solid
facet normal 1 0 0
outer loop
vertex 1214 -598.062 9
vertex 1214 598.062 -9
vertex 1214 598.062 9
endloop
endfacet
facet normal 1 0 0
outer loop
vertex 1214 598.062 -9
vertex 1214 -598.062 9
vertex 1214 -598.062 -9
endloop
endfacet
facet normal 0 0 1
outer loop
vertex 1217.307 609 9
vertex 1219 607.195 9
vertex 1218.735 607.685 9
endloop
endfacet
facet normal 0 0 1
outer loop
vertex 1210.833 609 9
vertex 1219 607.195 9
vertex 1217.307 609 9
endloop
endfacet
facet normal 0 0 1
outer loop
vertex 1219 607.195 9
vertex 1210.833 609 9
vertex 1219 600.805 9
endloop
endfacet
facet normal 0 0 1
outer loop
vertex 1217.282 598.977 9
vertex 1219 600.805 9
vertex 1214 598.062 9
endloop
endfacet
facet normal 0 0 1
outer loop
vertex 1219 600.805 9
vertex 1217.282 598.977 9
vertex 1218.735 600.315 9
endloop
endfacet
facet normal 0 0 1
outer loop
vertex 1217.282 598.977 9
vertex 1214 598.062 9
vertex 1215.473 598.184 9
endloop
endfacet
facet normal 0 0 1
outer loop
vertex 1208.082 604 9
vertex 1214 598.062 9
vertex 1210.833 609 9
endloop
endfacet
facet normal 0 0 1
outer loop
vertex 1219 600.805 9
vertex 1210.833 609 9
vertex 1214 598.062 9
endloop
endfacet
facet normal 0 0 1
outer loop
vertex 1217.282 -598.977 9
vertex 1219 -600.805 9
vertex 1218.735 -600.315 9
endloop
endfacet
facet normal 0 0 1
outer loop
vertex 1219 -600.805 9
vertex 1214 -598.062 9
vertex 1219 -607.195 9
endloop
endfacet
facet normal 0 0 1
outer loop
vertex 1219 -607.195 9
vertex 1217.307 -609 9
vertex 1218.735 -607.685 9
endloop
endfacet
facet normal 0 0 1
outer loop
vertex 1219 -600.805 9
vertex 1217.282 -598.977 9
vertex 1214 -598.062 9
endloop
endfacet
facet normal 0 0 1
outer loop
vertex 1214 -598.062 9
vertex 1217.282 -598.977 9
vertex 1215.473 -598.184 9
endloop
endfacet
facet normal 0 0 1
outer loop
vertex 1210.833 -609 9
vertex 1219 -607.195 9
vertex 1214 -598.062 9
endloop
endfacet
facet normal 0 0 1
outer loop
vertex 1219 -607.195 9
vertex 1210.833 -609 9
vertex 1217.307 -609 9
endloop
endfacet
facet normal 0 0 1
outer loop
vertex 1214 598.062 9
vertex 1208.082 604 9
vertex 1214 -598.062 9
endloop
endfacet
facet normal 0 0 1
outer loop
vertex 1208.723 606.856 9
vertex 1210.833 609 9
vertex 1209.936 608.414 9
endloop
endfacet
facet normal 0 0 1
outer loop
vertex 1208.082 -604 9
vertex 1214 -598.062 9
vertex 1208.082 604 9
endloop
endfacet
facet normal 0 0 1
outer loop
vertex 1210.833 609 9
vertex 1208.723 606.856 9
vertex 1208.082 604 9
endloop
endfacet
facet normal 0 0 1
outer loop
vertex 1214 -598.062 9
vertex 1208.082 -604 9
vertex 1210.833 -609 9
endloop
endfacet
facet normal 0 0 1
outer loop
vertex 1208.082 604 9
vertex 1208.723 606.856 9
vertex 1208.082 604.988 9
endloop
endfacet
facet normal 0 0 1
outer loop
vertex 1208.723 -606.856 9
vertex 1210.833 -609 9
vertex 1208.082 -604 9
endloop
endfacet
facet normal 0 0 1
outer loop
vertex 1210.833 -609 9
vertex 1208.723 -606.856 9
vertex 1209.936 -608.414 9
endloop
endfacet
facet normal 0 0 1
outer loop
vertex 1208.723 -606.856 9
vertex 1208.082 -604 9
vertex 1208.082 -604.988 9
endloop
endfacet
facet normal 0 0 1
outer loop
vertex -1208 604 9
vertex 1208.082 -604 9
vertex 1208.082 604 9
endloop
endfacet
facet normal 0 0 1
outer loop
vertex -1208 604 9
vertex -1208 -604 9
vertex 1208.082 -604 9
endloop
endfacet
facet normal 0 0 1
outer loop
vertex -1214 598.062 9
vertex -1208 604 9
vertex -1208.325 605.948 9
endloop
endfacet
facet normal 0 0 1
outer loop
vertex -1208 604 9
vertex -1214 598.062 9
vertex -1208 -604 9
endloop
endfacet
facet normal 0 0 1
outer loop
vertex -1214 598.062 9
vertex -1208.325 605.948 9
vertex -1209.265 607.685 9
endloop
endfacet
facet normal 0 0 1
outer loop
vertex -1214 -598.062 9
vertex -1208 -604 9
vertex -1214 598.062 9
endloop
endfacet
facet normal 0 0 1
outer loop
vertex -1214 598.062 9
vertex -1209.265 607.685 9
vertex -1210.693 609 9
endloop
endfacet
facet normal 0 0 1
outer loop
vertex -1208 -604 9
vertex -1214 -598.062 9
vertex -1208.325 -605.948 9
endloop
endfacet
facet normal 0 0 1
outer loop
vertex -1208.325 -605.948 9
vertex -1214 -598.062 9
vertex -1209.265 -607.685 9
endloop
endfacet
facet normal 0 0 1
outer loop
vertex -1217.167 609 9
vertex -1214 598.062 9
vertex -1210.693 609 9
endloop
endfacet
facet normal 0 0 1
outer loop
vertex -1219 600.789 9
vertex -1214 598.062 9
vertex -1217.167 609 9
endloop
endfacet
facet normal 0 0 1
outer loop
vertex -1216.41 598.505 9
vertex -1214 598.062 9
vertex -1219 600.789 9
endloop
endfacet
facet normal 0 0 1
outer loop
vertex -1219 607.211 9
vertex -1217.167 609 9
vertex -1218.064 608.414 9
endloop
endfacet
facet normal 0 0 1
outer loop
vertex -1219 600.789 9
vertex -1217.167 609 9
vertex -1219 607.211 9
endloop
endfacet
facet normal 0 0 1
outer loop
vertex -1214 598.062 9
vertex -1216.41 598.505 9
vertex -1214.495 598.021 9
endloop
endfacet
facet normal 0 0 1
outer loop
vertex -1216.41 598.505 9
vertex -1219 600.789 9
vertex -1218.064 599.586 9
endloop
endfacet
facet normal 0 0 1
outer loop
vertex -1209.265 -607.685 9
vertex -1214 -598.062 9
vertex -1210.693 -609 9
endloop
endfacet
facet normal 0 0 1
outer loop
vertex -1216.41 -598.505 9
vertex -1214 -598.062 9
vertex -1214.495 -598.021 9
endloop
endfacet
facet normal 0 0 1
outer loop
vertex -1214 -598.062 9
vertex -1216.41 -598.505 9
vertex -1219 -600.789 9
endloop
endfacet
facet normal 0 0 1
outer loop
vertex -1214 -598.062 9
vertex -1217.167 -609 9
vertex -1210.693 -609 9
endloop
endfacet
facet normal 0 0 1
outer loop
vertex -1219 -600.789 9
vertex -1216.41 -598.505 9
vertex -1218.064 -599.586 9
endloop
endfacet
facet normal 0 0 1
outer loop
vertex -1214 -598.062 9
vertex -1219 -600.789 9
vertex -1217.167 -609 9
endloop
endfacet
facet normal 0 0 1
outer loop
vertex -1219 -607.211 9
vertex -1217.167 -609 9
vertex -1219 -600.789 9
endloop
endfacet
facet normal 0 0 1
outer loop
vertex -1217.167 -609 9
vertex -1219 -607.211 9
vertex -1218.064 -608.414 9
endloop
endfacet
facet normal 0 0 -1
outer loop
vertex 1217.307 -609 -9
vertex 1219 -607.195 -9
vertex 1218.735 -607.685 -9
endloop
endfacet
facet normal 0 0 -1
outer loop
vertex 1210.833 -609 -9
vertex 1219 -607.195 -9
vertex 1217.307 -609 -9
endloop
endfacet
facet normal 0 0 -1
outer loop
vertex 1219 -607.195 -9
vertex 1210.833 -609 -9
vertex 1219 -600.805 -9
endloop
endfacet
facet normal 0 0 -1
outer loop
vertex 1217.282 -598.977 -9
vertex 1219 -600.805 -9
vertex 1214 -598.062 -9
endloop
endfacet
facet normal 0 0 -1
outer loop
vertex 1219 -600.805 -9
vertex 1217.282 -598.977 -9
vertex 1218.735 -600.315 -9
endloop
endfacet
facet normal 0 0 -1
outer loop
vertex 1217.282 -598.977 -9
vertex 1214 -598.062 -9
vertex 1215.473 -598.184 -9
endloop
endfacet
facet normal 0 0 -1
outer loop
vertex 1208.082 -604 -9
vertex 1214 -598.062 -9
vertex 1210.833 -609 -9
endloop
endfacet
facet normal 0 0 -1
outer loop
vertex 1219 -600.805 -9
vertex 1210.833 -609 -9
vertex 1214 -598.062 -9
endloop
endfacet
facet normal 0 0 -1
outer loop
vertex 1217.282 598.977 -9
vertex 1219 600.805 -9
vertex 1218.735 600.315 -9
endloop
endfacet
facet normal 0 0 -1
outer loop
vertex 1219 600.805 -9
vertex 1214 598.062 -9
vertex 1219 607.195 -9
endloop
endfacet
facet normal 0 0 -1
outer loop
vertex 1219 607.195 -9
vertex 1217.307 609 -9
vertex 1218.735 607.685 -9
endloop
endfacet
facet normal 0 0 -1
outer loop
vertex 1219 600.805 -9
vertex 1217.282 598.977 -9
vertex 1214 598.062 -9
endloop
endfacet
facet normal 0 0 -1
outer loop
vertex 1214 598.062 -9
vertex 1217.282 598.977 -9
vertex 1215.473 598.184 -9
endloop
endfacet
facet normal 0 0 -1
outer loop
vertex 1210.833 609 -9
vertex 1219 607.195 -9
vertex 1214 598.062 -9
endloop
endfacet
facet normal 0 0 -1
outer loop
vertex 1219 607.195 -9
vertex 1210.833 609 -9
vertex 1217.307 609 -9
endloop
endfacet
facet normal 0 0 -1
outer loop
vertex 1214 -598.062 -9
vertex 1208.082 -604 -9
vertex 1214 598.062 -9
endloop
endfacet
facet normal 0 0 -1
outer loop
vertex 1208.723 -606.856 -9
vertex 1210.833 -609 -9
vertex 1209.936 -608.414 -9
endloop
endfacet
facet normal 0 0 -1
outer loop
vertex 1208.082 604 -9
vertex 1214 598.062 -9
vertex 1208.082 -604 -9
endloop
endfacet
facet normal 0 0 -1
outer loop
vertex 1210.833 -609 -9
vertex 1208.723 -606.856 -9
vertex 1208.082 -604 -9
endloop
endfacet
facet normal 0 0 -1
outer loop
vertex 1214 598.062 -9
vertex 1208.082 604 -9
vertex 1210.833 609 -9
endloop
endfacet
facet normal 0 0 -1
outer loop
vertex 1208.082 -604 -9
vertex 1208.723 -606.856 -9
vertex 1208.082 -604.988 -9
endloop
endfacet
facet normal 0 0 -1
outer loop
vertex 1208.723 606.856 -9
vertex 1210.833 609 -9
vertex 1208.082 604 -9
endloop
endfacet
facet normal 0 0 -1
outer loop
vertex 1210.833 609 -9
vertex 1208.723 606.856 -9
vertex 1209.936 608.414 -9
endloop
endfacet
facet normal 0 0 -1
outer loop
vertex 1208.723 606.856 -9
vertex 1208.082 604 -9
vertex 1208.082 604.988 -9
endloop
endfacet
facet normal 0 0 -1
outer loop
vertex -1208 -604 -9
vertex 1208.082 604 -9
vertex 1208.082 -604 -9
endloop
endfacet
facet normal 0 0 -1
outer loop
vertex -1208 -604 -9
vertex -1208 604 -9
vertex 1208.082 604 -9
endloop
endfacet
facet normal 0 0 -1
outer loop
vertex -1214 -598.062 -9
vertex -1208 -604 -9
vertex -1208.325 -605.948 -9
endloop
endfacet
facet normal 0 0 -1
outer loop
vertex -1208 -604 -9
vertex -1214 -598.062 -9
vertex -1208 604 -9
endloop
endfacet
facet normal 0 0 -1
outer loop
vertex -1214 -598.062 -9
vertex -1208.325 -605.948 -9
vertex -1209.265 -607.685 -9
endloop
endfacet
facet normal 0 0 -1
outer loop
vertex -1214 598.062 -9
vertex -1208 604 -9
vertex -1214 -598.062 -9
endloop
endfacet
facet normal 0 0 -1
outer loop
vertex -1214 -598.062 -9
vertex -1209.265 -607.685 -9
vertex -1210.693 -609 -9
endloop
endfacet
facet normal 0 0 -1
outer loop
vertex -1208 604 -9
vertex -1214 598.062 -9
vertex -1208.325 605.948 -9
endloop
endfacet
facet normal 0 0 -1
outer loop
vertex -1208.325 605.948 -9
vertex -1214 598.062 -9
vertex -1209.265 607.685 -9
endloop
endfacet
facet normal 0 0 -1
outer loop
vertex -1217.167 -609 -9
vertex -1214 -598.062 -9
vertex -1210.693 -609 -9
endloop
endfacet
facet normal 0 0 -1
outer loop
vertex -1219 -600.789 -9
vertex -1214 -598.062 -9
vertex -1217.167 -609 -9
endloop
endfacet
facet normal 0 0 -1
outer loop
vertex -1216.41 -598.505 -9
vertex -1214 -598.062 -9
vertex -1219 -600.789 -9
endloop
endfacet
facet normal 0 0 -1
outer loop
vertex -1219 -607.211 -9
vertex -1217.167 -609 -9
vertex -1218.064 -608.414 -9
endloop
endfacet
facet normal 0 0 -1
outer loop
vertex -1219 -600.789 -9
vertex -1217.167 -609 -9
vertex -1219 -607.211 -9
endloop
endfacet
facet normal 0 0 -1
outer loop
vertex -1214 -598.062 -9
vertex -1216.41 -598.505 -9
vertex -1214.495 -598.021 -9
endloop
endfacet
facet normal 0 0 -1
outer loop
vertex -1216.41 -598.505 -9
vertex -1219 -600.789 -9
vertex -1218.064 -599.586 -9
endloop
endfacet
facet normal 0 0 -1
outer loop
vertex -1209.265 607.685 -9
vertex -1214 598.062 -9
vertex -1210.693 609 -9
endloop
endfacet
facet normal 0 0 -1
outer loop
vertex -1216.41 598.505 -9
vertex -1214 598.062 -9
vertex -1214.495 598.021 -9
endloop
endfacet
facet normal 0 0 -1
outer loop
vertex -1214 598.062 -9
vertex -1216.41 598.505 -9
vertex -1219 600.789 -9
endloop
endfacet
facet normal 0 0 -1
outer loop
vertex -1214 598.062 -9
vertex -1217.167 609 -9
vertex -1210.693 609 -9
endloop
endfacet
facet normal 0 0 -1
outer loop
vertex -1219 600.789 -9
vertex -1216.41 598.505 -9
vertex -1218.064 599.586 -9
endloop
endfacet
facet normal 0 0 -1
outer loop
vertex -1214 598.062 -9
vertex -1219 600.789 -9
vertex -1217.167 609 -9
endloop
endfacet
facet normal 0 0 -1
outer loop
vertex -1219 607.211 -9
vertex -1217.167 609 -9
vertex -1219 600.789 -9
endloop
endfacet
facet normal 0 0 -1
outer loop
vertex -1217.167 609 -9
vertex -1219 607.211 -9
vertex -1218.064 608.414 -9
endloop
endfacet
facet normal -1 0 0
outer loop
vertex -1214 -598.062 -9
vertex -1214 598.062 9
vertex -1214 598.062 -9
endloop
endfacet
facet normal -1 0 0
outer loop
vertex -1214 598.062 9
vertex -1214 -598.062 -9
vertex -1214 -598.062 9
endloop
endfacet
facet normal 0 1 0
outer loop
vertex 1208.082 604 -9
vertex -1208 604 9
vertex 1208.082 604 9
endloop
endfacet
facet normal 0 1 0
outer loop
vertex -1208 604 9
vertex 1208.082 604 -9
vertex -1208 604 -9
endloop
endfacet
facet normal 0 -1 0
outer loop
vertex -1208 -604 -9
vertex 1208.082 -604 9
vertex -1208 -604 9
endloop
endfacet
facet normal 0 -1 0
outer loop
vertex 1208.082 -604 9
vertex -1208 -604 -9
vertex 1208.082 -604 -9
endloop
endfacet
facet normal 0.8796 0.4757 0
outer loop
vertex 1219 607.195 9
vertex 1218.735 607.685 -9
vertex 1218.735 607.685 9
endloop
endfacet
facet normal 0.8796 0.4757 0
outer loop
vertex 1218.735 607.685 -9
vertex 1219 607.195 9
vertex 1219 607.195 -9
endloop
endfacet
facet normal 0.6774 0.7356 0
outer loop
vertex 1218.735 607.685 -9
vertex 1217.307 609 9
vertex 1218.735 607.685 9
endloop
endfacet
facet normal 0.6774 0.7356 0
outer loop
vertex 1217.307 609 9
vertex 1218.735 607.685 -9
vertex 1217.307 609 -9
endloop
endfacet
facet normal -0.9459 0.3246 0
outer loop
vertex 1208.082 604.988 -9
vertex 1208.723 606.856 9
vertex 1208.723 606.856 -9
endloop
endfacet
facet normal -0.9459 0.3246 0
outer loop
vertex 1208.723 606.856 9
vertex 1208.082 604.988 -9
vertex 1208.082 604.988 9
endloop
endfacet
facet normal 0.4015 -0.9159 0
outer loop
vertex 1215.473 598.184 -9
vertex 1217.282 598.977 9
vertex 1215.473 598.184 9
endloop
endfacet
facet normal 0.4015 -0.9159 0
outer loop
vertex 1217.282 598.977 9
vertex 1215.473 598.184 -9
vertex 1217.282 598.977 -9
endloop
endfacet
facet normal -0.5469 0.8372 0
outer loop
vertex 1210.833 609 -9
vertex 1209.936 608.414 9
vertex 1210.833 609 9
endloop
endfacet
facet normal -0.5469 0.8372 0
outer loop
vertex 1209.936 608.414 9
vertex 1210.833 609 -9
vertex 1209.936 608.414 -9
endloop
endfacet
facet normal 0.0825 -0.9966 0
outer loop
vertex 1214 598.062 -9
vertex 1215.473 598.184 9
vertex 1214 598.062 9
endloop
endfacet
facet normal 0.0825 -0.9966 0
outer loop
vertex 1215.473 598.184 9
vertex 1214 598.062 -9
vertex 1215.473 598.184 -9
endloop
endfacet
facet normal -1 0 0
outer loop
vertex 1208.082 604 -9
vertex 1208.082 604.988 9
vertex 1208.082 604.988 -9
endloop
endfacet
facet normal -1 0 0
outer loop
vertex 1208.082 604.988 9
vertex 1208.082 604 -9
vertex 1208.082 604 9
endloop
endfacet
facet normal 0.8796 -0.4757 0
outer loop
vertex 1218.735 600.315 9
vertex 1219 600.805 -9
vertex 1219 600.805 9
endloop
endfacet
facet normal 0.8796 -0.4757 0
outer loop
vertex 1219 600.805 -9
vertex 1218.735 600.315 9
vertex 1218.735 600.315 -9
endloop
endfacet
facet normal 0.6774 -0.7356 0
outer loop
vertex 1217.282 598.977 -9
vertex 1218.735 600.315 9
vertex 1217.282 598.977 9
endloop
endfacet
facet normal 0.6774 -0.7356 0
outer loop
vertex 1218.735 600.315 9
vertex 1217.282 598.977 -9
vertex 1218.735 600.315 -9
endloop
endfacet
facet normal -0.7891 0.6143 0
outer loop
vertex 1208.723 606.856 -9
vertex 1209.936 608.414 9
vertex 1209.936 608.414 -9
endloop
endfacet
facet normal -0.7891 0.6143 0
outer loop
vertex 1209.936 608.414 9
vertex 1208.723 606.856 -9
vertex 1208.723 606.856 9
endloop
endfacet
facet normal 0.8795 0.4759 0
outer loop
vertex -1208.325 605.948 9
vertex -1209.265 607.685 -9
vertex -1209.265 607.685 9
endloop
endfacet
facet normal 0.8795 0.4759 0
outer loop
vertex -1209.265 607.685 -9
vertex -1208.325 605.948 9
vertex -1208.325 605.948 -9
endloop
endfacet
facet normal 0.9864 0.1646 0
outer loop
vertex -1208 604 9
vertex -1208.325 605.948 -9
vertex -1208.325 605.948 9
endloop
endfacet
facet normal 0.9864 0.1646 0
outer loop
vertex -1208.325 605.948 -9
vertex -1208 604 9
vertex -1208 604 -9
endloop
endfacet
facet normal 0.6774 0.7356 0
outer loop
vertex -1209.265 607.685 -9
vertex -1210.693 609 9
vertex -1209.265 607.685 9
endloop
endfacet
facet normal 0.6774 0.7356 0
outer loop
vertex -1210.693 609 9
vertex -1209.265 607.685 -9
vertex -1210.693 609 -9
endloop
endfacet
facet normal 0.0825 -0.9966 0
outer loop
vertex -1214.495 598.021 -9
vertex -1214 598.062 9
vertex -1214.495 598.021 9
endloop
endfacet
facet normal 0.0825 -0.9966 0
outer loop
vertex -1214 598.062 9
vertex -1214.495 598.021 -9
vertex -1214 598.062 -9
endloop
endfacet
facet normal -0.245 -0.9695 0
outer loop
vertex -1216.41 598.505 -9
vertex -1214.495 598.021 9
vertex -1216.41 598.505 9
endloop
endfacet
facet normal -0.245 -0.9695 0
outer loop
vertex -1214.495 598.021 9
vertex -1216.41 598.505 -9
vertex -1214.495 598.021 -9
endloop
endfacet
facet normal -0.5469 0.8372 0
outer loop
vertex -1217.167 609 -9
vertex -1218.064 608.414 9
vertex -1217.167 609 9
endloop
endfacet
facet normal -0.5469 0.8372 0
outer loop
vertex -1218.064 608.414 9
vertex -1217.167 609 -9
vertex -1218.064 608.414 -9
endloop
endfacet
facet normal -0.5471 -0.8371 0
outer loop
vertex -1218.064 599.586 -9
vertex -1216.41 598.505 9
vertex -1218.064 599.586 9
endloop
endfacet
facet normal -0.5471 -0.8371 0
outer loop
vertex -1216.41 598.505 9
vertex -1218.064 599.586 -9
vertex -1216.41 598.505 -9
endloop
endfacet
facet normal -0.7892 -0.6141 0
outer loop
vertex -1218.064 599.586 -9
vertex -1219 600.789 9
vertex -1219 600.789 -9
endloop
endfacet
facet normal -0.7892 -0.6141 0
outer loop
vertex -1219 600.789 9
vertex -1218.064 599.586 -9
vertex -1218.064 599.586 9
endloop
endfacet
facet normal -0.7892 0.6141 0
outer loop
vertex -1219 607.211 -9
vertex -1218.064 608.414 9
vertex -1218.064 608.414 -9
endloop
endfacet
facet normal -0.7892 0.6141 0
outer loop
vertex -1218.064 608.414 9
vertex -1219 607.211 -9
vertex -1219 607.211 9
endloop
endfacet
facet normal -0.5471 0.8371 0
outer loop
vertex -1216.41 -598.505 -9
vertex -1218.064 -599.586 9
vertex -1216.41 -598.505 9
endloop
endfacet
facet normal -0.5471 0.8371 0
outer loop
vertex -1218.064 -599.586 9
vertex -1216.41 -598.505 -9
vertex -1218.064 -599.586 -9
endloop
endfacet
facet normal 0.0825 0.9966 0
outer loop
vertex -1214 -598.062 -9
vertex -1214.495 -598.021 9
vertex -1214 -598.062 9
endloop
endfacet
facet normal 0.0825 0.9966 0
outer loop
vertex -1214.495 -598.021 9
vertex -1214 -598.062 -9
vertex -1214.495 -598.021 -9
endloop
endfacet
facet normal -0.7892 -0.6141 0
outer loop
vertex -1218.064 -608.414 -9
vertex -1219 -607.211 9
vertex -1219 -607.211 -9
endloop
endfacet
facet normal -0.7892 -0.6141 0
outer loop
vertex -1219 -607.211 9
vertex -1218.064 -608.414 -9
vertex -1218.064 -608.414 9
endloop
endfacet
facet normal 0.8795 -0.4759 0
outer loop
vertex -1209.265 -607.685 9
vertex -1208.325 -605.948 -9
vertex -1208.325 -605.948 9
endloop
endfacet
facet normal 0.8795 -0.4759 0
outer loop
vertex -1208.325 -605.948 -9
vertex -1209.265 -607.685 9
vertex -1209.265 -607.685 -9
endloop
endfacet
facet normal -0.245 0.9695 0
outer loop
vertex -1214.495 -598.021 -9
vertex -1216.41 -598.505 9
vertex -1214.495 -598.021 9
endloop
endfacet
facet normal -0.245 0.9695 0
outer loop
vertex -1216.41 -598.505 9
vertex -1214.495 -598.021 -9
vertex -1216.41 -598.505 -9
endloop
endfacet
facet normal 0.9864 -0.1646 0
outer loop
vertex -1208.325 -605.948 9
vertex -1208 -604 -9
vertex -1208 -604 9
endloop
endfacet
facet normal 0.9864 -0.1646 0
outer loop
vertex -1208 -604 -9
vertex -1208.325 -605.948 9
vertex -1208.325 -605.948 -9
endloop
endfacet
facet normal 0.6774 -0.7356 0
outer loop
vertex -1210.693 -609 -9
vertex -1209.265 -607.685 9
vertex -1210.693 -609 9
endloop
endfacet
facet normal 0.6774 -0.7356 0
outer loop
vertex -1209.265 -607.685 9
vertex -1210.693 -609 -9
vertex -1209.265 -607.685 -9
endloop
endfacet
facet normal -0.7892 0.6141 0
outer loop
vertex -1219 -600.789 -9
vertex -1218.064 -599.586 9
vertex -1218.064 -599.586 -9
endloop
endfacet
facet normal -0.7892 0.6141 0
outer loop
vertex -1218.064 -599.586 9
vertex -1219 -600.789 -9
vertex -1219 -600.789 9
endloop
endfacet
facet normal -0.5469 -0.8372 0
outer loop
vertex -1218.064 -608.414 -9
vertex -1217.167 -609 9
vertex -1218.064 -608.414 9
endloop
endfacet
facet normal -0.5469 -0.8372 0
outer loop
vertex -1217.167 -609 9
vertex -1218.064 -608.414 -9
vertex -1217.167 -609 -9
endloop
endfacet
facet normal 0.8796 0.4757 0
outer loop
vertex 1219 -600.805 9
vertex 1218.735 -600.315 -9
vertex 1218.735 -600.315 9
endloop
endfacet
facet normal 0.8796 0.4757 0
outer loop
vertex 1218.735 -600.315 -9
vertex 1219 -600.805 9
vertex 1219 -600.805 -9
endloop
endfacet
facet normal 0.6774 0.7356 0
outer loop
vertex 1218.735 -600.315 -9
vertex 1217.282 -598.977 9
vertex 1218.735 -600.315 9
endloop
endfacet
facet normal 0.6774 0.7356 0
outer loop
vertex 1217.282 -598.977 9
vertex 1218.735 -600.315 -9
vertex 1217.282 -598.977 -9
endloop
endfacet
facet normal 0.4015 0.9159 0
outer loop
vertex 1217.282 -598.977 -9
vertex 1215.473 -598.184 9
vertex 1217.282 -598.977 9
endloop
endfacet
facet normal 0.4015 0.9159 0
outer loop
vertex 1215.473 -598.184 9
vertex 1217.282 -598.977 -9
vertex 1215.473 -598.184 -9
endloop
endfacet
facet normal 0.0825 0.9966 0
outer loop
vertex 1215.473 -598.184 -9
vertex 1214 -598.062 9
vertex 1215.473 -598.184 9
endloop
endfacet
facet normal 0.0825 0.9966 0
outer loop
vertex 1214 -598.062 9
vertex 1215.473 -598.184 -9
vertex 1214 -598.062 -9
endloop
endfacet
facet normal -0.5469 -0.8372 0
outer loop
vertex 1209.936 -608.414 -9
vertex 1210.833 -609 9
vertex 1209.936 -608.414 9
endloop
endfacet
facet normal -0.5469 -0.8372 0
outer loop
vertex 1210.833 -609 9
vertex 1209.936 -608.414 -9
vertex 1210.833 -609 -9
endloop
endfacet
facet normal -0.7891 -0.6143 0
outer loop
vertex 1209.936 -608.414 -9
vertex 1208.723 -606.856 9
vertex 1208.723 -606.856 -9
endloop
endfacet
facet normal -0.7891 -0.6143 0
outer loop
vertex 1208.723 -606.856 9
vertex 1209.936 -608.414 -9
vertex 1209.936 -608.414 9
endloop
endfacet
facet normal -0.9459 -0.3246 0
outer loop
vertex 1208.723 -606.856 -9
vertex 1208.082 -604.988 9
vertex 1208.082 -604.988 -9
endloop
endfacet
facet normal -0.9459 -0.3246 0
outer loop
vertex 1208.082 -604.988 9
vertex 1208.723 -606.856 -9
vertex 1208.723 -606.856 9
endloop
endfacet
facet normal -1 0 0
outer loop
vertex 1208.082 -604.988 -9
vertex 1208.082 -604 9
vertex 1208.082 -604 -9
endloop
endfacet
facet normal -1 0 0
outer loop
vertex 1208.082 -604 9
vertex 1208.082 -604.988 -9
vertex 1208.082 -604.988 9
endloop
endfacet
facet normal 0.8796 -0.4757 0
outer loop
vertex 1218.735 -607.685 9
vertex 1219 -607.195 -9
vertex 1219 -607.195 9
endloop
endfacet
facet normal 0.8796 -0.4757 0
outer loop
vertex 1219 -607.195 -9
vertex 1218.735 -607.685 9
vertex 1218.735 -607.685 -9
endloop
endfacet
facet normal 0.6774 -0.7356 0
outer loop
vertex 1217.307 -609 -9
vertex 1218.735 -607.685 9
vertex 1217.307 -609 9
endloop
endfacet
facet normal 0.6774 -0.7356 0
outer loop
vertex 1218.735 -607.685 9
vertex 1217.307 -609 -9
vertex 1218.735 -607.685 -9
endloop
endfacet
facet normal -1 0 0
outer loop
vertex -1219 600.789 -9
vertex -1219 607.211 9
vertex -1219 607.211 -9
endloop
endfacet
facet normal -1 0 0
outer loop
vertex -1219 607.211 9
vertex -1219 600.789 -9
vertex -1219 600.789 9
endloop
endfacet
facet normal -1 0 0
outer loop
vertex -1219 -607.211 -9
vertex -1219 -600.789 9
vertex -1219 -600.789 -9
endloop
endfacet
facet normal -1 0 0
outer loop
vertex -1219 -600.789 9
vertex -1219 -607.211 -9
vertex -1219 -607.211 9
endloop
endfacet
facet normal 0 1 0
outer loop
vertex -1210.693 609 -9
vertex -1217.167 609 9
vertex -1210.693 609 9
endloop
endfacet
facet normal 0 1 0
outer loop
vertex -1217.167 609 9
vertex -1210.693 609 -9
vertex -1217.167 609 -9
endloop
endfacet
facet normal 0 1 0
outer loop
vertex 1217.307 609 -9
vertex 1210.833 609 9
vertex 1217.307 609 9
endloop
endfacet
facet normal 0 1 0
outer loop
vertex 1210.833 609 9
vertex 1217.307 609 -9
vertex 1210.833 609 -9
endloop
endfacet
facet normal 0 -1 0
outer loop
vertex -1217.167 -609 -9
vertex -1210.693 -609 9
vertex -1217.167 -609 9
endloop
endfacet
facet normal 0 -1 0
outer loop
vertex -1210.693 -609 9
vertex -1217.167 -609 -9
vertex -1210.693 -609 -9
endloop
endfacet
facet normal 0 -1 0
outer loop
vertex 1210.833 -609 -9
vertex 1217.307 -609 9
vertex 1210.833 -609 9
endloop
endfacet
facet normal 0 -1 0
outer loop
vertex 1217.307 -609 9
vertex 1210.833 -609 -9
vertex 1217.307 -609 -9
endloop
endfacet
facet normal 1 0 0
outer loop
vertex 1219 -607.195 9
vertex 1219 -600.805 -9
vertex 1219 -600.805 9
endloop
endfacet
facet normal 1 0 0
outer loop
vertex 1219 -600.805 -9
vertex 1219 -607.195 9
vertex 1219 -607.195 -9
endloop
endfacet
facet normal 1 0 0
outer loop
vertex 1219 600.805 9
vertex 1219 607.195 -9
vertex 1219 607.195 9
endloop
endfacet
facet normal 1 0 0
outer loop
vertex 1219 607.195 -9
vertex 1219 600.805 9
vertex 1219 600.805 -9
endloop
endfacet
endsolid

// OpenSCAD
// Parameters
sheet_length = 2440; //[1220:4880:1]
sheet_width = 1220; //[610:2440:1]
sheet_thickness = 18; //[9:36:1]
corner_radius = 6; //[0:30:1]
edge_chamfer = 1; //[0:3:0.5]
connect_overlap = 1; //[0.5:2:0.5]

// Base Shapes
module mdf_sheet_panel() {
  cube([sheet_length, sheet_width, sheet_thickness], center=true);
}

module corner_rounding() {
  cube([sheet_length - 2*corner_radius, sheet_width - 2*corner_radius, sheet_thickness], center=true);
}

module corner_rounding_cyl_1() {
  translate([sheet_length/2 - corner_radius, sheet_width/2 - corner_radius, 0])
    cylinder(r=corner_radius, h=sheet_thickness, center=true);
}

module corner_rounding_cyl_2() {
  translate([-sheet_length/2 + corner_radius, sheet_width/2 - corner_radius, 0])
    cylinder(r=corner_radius, h=sheet_thickness, center=true);
}

module corner_rounding_cyl_3() {
  translate([-sheet_length/2 + corner_radius, -sheet_width/2 + corner_radius, 0])
    cylinder(r=corner_radius, h=sheet_thickness, center=true);
}

module corner_rounding_cyl_4() {
  translate([sheet_length/2 - corner_radius, -sheet_width/2 + corner_radius, 0])
    cylinder(r=corner_radius, h=sheet_thickness, center=true);
}

module edge_chamfer_top_inset() {
  translate([0, 0, sheet_thickness/4])
    cube([sheet_length - 2*edge_chamfer, sheet_width - 2*edge_chamfer, sheet_thickness/2 + connect_overlap], center=true);
}

module edge_chamfer_bottom_inset() {
  translate([0, 0, -sheet_thickness/4])
    cube([sheet_length - 2*edge_chamfer, sheet_width - 2*edge_chamfer, sheet_thickness/2 + connect_overlap], center=true);
}

module surface_label_text() {
  translate([0, 0, sheet_thickness/2 - (sheet_thickness/100)])
    cube([sheet_length/10, sheet_width/10, sheet_thickness/50], center=true);
}

// Operations
module corner_rounding_union() {
  union() {
    corner_rounding();
    corner_rounding_cyl_1();
    corner_rounding_cyl_2();
    corner_rounding_cyl_3();
    corner_rounding_cyl_4();
  }
}

module edge_chamfer() {
  hull() {
    edge_chamfer_top_inset();
    edge_chamfer_bottom_inset();
  }
}

module sheet_with_rounding() {
  intersection() {
    mdf_sheet_panel();
    corner_rounding_union();
  }
}

module sheet_with_rounding_and_chamfer() {
  intersection() {
    sheet_with_rounding();
    edge_chamfer();
  }
}

module complete_model() {
  union() {
    sheet_with_rounding_and_chamfer();
    surface_label_text();
  }
}

// Final Output
complete_model();
